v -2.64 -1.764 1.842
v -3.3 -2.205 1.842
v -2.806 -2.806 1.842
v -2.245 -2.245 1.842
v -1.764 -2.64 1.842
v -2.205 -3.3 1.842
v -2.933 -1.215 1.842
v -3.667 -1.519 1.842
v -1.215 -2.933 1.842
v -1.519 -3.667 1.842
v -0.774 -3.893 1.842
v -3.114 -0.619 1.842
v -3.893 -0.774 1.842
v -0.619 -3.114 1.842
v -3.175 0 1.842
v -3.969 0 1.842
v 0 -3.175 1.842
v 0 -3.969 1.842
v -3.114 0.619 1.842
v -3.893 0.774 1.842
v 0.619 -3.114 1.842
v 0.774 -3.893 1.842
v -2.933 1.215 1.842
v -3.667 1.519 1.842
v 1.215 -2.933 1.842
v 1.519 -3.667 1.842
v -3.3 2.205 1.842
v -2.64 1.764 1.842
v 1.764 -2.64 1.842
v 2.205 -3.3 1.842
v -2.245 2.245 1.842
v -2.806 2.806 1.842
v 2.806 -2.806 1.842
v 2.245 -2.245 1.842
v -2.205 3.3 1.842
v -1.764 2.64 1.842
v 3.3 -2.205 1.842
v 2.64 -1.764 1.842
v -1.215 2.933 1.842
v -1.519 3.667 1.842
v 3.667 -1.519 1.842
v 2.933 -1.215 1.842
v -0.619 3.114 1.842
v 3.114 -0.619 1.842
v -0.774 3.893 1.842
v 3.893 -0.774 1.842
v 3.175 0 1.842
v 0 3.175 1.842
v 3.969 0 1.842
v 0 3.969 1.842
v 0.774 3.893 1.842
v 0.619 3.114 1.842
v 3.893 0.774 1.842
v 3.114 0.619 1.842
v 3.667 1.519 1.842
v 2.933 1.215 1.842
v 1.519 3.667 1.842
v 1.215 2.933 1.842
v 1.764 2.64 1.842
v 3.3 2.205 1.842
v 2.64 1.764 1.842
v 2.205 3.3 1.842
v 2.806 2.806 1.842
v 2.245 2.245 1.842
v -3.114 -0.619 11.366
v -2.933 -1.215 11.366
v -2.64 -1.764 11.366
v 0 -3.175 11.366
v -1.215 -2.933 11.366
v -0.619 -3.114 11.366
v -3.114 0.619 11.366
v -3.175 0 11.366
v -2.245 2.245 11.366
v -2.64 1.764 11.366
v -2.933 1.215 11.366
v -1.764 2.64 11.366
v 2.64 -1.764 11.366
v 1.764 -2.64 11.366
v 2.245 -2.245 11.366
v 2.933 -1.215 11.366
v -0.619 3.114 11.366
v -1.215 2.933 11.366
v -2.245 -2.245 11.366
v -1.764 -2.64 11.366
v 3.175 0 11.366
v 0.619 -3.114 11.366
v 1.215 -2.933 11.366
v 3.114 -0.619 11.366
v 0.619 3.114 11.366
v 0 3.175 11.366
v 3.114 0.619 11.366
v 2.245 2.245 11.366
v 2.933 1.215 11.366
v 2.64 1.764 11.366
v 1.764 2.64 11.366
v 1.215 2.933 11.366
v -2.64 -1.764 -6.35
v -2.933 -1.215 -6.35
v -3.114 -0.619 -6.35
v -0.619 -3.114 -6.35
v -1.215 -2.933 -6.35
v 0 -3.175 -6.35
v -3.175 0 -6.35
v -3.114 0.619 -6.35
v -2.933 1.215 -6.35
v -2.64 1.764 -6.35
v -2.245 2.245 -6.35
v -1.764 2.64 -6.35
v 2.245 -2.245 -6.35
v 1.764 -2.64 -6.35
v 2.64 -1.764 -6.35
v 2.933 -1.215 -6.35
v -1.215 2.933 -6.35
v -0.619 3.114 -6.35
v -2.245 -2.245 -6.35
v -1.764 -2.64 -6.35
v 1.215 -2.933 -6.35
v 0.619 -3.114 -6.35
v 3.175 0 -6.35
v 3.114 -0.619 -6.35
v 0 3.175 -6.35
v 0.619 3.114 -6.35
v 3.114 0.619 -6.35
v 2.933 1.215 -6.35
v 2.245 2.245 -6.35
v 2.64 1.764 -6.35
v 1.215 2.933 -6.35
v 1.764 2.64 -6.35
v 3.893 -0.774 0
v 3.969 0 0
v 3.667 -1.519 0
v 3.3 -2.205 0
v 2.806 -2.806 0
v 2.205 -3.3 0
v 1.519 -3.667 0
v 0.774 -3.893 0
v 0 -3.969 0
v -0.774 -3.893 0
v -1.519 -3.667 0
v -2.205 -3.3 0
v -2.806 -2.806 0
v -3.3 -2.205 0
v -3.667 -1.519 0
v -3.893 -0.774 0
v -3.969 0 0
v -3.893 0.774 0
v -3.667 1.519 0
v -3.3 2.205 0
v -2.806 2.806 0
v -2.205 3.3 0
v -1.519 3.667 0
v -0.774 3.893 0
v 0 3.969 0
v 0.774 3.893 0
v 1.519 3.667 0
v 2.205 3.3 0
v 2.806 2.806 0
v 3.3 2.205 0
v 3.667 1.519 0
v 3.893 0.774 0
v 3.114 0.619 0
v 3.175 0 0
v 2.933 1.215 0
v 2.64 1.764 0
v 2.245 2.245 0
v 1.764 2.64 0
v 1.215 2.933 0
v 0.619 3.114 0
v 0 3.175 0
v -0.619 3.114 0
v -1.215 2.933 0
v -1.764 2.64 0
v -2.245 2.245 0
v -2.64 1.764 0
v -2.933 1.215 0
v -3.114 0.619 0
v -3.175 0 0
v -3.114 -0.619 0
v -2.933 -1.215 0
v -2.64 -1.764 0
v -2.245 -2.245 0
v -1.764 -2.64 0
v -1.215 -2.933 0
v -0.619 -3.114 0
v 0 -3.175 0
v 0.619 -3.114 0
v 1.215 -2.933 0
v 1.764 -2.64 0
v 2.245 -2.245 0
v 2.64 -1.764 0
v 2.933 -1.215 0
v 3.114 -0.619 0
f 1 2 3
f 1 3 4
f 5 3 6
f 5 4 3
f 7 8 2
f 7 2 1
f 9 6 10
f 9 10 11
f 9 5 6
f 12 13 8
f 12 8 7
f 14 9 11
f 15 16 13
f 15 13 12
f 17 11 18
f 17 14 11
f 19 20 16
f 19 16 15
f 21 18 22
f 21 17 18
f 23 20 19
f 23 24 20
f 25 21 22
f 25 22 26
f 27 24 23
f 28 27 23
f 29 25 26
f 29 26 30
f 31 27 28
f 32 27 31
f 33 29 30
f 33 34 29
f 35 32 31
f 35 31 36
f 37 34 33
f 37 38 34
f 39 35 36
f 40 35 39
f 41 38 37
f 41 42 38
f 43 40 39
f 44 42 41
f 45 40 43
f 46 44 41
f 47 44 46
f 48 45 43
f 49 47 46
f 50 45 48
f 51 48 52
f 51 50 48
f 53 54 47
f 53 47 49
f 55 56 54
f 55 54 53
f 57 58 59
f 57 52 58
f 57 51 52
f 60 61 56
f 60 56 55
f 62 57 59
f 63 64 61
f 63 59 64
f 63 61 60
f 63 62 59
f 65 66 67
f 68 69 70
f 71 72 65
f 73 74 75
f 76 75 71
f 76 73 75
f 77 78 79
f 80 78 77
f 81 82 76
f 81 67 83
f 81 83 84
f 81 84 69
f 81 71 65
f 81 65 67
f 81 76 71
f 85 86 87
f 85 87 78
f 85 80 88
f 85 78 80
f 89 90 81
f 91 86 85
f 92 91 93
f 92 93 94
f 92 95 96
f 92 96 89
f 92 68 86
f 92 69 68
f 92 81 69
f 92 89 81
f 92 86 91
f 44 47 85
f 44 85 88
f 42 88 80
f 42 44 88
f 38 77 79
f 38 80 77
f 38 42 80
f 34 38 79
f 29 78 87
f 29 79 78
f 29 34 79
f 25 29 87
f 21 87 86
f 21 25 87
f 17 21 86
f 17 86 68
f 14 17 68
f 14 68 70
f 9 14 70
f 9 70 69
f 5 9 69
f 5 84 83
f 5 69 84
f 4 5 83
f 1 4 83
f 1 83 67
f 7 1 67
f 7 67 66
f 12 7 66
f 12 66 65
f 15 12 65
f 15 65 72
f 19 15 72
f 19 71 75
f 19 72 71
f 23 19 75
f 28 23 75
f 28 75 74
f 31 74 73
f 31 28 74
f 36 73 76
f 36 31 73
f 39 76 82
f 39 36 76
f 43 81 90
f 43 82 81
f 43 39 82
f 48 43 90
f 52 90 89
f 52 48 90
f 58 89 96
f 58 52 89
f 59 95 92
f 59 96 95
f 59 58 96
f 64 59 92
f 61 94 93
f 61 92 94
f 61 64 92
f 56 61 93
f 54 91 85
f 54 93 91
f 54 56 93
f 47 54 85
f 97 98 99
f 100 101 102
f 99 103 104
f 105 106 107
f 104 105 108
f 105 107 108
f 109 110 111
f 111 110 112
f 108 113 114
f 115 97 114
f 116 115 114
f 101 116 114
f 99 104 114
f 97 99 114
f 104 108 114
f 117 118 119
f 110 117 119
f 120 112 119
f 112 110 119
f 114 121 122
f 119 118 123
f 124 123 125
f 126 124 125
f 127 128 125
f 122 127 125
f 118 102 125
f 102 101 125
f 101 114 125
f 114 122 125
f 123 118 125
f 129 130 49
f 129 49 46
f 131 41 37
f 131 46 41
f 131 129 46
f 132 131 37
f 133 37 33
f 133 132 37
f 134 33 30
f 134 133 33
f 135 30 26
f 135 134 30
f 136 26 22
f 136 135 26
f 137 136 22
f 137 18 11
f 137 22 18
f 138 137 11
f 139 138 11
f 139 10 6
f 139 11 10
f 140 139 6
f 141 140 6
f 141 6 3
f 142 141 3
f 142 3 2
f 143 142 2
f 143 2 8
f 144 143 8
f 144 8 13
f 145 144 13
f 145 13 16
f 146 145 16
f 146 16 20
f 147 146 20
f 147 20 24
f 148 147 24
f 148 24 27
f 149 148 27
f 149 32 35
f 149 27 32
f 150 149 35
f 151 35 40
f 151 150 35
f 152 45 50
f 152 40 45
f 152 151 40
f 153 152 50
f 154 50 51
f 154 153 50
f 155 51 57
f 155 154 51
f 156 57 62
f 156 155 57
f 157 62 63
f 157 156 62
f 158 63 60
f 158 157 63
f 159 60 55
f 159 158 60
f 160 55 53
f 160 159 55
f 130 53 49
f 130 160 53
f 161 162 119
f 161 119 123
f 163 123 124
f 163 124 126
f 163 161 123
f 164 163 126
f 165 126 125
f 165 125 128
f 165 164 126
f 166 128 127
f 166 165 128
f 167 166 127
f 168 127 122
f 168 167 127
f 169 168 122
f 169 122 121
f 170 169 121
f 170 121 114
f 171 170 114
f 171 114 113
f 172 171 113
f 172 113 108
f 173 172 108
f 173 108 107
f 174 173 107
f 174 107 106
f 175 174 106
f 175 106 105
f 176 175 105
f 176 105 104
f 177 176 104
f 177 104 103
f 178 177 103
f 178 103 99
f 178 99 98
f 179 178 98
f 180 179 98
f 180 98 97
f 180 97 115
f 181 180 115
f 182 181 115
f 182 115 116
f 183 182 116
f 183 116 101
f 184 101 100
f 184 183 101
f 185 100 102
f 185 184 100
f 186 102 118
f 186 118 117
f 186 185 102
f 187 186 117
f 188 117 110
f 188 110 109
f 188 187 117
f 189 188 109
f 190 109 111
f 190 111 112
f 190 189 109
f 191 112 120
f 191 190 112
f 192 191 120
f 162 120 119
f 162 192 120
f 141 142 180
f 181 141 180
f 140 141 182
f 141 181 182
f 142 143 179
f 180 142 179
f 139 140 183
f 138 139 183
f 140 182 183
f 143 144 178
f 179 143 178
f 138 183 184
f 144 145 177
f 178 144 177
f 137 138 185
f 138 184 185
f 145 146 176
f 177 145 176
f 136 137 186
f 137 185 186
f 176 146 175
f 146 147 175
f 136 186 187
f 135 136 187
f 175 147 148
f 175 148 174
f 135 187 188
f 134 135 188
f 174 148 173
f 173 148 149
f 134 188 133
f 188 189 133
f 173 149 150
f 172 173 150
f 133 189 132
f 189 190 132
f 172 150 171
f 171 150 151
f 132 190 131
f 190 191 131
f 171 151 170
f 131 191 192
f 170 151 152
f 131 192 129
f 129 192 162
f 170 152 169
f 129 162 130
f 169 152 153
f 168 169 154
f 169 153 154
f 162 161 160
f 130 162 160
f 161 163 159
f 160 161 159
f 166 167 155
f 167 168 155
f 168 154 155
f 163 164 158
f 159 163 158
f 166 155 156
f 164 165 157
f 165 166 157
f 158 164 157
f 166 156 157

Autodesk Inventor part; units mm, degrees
ref_plane "YZ Plane" through (0, 0, 0) normal (1, 0, 0) x (0, 1, 0)
ref_plane "XZ Plane" through (0, 0, 0) normal (0, 1, 0) x (-1, 0, 0)
ref_plane "XY Plane" through (0, 0, 0) normal (0, 0, 1) x (1, 0, 0)
sketch "Sketch1" plane through (0, 0, 0) normal (0, 0, 1) x (1, 0, 0)
  circle A0 centre (0, 0) radius 3.175
  circle A1 centre (0, 0) radius 3.9688
  dimension "d0" = 6.35
  dimension "d1" = 7.9375
extrude "Extrusion1" add sketch "Sketch1" along normal blind 1.8415 contours A0 | A1
extrude "Extrusion2" add sketch "Sketch1" against normal blind 6.35 contours A0
sketch "Sketch2" plane through (0, 0, 1.8415) normal (0, 0, 1) x (1, 0, 0)
  circle A0 centre (0, 0) radius 3.9687 projected
  circle A1 centre (0, 0) radius 3.175
  dimension "d6" = 6.35
extrude "Extrusion3" add sketch "Sketch2" along normal blind 9.525 contours A1
properties part number "Encoder Idler Shaft"
